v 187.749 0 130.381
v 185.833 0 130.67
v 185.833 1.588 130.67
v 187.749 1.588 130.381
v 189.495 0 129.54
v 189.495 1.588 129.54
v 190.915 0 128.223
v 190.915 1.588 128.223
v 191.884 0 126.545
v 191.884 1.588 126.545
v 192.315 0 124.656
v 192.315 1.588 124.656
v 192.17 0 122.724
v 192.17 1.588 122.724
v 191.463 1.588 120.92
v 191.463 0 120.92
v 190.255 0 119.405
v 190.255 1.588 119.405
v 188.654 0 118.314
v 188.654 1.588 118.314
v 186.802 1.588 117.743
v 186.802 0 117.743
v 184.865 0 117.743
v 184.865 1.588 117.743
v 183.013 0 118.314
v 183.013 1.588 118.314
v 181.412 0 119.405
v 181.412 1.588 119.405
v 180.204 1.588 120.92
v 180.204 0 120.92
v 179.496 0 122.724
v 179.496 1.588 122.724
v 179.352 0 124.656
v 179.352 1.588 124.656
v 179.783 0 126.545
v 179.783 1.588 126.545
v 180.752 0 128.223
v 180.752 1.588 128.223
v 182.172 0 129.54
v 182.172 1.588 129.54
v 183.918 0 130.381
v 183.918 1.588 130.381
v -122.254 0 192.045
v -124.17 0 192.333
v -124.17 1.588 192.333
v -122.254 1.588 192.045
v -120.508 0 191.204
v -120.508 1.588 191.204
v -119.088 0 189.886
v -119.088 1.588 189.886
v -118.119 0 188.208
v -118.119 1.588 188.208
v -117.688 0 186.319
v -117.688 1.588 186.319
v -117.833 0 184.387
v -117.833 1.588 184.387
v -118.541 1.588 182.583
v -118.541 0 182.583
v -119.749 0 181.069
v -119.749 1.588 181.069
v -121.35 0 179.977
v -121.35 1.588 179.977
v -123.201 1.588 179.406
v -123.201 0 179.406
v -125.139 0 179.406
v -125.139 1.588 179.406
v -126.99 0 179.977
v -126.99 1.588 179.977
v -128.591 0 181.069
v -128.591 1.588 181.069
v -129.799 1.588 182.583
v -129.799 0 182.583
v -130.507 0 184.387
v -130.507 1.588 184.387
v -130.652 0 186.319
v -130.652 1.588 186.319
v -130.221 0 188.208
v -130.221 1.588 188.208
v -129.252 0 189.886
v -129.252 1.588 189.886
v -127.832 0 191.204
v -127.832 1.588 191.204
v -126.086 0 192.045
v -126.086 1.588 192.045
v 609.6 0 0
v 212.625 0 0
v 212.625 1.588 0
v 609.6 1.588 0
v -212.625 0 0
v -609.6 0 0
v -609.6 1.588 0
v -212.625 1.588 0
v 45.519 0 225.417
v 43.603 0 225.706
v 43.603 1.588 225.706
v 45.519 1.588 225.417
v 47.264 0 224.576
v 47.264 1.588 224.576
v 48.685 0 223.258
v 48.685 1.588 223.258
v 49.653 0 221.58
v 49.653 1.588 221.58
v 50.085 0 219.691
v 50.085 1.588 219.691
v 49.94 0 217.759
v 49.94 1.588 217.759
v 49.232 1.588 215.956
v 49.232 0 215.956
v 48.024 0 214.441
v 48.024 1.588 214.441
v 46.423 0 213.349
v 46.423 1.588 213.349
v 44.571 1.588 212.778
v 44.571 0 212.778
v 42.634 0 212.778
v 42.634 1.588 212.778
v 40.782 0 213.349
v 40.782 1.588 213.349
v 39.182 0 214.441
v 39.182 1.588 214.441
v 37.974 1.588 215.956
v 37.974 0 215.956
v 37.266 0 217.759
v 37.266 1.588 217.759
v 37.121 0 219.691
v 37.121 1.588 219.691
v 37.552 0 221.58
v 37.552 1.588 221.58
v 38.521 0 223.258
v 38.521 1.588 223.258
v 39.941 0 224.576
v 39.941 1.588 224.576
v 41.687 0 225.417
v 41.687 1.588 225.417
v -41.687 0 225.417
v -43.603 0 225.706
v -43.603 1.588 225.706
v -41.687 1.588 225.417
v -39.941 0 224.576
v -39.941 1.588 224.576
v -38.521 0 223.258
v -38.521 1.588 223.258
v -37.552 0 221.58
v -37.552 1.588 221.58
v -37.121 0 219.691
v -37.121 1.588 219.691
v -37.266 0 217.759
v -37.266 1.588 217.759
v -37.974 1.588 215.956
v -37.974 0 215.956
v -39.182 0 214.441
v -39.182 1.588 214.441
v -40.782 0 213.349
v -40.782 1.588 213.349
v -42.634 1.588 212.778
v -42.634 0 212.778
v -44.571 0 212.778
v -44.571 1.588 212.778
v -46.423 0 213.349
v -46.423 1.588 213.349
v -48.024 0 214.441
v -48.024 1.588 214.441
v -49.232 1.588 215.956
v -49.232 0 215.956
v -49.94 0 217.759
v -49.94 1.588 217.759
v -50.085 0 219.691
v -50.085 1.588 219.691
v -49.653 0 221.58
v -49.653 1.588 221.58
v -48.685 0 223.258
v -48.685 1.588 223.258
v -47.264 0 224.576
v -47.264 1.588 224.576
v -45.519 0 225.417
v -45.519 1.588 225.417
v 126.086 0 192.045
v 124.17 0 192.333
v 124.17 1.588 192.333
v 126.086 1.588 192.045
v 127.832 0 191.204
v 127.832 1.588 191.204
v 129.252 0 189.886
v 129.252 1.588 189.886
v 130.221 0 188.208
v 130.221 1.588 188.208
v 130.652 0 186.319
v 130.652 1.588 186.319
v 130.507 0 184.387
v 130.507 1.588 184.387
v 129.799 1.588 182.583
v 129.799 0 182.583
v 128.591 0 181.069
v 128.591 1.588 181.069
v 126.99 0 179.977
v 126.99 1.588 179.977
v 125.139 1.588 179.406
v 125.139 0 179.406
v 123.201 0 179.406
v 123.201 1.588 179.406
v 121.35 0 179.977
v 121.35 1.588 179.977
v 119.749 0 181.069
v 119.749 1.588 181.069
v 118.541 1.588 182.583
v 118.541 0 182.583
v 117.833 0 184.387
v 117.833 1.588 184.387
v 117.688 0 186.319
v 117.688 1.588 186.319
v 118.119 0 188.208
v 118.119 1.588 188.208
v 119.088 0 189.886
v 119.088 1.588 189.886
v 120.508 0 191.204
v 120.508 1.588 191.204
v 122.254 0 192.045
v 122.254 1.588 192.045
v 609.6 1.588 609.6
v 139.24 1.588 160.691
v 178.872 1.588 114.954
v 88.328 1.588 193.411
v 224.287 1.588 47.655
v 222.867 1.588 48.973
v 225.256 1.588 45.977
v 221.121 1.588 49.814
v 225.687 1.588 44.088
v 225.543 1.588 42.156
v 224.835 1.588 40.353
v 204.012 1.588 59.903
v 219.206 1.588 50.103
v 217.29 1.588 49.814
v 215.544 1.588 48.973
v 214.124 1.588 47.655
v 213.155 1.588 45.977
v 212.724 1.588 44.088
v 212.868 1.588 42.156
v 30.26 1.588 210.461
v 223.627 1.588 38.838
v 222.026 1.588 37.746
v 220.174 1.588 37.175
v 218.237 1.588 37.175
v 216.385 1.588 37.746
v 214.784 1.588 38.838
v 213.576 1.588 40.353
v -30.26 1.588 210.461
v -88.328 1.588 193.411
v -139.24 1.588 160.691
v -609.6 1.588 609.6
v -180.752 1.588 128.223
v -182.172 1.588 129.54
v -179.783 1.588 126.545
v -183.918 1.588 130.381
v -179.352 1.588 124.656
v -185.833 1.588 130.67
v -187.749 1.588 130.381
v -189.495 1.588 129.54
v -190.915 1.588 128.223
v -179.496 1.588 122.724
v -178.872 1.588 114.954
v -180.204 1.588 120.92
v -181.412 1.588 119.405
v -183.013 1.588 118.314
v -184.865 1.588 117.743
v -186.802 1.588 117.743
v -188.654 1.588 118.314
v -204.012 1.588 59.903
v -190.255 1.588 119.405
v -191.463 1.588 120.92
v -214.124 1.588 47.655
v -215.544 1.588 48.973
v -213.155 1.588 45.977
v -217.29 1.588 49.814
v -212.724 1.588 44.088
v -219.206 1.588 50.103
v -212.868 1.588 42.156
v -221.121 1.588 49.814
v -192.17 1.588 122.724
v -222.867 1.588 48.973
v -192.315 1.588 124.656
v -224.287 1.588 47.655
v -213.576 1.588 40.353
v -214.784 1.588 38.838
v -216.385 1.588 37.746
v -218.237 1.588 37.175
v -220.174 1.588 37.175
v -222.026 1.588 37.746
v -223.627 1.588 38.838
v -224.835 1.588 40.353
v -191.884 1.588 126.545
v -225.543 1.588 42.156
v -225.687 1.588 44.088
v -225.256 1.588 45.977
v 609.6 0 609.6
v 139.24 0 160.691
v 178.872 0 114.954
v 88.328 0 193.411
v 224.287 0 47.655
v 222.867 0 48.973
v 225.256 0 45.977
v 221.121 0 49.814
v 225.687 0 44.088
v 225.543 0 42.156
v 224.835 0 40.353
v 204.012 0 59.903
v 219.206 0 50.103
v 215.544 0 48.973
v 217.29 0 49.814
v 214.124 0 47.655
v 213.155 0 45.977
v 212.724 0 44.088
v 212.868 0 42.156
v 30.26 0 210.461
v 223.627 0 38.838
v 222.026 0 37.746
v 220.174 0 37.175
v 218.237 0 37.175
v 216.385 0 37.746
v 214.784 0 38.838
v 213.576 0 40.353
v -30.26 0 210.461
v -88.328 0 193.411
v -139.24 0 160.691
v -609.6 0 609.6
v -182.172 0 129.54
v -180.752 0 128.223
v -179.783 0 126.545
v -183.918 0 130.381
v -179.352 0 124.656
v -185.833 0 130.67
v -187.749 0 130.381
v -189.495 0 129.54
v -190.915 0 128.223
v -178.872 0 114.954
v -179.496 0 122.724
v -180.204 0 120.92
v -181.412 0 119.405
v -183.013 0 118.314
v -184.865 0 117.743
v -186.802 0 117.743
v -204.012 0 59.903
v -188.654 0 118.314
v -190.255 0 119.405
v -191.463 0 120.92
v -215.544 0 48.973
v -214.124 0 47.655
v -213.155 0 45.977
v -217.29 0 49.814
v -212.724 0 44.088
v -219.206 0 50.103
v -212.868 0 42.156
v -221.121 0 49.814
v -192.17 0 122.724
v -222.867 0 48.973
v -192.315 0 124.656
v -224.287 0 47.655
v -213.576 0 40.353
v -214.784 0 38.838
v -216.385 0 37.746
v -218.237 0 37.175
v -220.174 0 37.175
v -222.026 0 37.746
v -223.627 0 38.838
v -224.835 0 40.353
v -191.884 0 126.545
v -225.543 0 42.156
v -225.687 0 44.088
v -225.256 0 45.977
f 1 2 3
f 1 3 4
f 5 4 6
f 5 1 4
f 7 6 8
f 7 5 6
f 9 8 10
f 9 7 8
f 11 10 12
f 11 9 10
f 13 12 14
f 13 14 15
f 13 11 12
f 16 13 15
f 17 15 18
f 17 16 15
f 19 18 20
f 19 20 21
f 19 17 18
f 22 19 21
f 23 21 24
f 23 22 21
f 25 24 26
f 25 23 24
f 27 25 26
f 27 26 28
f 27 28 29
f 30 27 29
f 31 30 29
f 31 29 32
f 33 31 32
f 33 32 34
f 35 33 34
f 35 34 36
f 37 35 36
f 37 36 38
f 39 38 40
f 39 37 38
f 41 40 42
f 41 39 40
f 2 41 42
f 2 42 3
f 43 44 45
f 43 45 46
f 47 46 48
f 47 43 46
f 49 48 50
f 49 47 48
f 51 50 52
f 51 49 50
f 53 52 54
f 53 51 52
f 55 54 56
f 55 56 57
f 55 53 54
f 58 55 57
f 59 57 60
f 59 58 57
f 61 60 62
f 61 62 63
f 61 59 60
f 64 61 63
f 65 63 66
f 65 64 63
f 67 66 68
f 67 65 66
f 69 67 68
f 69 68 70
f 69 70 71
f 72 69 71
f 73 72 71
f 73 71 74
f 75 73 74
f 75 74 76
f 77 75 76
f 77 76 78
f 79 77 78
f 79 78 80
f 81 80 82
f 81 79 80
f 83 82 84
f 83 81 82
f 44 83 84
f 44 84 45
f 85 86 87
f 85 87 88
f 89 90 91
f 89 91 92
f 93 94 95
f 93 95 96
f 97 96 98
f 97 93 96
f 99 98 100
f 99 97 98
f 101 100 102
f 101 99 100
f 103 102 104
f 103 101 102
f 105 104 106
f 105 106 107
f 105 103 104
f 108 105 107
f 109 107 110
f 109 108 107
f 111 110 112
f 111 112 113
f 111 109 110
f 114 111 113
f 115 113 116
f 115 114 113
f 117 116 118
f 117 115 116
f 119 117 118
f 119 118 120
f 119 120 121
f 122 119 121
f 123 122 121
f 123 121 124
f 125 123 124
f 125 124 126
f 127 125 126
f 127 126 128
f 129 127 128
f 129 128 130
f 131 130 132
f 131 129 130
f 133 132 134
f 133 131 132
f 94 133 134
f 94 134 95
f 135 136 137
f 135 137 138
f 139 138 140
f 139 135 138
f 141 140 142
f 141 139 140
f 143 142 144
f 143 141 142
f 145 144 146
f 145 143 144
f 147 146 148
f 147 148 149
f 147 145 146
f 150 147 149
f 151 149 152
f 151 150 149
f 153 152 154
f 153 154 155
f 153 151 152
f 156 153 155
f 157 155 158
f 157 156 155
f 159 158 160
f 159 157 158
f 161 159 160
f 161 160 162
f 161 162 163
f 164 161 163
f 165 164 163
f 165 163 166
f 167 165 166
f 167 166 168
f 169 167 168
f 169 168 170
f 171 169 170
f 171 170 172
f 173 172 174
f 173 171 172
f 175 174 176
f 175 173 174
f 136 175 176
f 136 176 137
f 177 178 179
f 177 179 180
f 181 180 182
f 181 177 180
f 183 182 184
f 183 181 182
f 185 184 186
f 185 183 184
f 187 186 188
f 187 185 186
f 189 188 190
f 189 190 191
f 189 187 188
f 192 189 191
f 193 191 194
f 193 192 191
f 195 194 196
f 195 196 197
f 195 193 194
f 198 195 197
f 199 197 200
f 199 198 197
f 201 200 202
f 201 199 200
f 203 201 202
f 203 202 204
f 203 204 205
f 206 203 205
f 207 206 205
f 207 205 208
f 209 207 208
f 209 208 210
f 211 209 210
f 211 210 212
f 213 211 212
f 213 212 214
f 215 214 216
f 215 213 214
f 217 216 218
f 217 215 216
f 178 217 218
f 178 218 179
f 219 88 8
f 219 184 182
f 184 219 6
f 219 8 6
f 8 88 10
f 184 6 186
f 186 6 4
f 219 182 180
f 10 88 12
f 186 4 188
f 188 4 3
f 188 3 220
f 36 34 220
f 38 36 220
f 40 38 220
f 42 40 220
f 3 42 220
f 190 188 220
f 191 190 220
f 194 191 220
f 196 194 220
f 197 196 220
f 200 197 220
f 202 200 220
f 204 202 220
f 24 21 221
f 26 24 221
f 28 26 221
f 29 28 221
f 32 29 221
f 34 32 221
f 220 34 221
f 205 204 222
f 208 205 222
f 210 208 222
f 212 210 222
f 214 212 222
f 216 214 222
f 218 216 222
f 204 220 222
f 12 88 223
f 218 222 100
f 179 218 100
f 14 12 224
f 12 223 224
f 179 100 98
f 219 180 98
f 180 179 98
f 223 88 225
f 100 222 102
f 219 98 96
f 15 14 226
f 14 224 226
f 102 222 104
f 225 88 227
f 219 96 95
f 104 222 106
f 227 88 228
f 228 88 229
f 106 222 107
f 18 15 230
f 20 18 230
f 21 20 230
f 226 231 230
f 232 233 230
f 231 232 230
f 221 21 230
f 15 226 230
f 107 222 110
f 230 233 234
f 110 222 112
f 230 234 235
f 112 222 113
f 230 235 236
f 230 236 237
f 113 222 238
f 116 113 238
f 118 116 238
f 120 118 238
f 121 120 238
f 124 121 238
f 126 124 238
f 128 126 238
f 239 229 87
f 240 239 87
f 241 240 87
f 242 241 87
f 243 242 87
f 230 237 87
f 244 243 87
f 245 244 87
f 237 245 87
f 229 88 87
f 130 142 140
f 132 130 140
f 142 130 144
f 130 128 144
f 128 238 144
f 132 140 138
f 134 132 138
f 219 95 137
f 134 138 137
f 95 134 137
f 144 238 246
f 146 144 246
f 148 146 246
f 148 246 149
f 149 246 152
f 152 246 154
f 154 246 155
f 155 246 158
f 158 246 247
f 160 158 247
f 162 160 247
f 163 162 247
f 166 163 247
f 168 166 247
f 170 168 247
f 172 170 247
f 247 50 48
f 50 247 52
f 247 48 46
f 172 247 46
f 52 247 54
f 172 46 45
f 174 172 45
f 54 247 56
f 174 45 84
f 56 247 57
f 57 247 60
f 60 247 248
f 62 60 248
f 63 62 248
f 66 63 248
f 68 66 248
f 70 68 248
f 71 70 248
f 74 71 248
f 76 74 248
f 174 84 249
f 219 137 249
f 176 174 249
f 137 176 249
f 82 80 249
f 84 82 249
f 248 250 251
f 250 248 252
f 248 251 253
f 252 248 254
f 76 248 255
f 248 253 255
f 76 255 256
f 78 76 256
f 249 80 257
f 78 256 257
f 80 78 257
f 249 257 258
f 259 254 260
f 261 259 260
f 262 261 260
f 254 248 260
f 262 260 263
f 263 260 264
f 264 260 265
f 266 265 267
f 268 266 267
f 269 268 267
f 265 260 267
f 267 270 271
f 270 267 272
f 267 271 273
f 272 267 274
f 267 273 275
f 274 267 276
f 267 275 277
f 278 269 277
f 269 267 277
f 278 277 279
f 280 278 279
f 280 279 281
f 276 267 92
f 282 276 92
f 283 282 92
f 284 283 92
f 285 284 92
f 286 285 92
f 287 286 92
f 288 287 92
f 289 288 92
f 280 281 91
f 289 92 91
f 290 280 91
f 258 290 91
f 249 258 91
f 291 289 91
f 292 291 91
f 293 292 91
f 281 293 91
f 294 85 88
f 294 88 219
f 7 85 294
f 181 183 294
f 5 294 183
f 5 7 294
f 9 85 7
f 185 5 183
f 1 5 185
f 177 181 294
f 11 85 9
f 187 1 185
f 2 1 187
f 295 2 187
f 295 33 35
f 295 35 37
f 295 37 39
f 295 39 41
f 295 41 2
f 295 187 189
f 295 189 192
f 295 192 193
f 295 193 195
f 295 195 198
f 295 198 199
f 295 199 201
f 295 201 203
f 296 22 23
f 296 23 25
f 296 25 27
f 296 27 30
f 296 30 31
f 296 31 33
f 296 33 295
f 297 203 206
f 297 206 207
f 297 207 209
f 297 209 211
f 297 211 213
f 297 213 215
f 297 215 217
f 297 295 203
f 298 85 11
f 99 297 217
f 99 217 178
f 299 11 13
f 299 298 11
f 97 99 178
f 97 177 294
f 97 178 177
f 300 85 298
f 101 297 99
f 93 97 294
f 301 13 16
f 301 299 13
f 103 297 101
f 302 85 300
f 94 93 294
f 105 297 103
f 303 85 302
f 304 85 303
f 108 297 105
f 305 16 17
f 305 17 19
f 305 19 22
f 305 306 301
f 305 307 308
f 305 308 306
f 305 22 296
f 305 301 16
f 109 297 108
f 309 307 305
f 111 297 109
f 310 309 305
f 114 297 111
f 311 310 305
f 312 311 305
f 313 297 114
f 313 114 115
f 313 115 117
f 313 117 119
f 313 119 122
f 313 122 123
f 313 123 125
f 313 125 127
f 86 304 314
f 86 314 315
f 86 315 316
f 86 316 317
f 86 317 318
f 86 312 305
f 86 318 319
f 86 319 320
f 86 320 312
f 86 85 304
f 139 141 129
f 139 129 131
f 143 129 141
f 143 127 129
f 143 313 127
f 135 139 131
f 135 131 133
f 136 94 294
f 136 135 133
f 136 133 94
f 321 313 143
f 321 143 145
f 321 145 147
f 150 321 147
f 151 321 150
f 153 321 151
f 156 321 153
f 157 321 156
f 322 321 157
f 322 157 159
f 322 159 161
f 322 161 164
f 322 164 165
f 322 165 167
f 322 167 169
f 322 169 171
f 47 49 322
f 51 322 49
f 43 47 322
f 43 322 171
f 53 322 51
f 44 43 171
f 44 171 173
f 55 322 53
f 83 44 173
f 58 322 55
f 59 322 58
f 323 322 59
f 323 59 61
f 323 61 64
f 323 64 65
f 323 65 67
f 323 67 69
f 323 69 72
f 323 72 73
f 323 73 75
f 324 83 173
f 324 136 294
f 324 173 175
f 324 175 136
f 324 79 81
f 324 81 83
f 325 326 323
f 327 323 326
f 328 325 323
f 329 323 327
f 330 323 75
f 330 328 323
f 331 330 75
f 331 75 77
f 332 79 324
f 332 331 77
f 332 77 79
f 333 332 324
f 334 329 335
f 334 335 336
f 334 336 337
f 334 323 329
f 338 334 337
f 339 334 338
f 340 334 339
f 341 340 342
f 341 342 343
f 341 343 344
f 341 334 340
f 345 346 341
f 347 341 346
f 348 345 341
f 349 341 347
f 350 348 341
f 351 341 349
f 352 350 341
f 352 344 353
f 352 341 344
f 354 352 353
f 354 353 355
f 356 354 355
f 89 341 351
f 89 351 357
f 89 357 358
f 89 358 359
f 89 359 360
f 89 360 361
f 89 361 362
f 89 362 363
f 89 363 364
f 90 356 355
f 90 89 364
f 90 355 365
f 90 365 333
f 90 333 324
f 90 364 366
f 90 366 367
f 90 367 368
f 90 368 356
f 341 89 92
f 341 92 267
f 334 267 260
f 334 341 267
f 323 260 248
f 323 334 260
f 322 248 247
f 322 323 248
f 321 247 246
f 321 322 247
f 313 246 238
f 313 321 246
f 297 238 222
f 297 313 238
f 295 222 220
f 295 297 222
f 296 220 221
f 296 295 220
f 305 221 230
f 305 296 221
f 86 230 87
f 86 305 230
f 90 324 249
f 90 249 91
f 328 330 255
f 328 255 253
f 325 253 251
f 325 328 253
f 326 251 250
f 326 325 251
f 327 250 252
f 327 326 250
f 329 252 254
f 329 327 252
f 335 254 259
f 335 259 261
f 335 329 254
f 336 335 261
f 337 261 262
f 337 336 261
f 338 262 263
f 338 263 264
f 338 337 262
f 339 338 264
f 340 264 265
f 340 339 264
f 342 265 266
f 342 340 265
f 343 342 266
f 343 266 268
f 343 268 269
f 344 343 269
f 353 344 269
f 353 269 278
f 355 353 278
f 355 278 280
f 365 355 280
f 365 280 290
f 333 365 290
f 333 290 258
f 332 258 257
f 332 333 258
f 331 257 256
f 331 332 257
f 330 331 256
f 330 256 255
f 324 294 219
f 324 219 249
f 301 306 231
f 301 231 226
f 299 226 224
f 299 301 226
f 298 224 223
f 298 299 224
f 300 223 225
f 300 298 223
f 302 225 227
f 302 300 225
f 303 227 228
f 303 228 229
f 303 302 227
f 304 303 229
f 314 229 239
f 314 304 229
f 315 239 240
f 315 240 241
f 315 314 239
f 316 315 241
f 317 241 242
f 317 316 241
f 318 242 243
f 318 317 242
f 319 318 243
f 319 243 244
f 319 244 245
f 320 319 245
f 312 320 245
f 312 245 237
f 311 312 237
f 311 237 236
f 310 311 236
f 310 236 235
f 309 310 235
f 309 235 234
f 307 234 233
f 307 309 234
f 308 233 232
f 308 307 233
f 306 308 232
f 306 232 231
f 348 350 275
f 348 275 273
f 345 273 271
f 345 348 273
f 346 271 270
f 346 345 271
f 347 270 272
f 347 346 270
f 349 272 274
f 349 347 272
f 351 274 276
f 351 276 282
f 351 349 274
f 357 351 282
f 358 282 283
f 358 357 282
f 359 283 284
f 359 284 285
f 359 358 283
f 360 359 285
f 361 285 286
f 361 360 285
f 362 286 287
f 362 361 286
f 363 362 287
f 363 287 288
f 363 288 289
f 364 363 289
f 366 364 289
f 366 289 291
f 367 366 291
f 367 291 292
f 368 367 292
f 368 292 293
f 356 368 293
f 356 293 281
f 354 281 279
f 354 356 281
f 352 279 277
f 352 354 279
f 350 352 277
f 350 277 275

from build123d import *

# Parameters (mm, degrees)
SKETCH2_R           = 6.5
BOSS_EXTRUDE2_DEPTH = 1.5875


with BuildPart() as part:
    # Sketch2 → Boss-Extrude2 (new body)
    with BuildSketch(Plane(origin=(0, 0, 0), x_dir=(1, 0, 0), z_dir=(0, 1, 0))):
        with BuildLine():
            ThreePointArc((-212.625, 0), (0, -212.625), (212.625, 0))
            Line((212.625, 0), (609.6, 0))
            Line((609.6, 0), (609.6, -609.6))
            Line((609.6, -609.6), (-609.6, -609.6))
            Line((-609.6, -609.6), (-609.6, 0))
            Line((-609.6, 0), (-212.625, 0))
        make_face()
        with Locations(Location((-219.20551017, -43.602686971, 0), (0, 0, 270))):
            Circle(SKETCH2_R, mode=Mode.SUBTRACT)
        with Locations(Location((-185.83345835, -124.16994708, 0), (0, 0, 270))):
            Circle(SKETCH2_R, mode=Mode.SUBTRACT)
        with Locations(Location((-124.16994708, -185.83345835, 0), (0, 0, 270))):
            Circle(SKETCH2_R, mode=Mode.SUBTRACT)
        with Locations(Location((-43.602686971, -219.20551017, 0), (0, 0, 270))):
            Circle(SKETCH2_R, mode=Mode.SUBTRACT)
        with Locations(Location((43.602686971, -219.20551017, 0), (0, 0, 270))):
            Circle(SKETCH2_R, mode=Mode.SUBTRACT)
        with Locations(Location((124.16994708, -185.83345835, 0), (0, 0, 270))):
            Circle(SKETCH2_R, mode=Mode.SUBTRACT)
        with Locations(Location((185.83345835, -124.16994708, 0), (0, 0, 270))):
            Circle(SKETCH2_R, mode=Mode.SUBTRACT)
        with Locations(Location((219.20551017, -43.602686971, 0), (0, 0, 270))):
            Circle(SKETCH2_R, mode=Mode.SUBTRACT)
    extrude(amount=BOSS_EXTRUDE2_DEPTH)


solid = part.part
